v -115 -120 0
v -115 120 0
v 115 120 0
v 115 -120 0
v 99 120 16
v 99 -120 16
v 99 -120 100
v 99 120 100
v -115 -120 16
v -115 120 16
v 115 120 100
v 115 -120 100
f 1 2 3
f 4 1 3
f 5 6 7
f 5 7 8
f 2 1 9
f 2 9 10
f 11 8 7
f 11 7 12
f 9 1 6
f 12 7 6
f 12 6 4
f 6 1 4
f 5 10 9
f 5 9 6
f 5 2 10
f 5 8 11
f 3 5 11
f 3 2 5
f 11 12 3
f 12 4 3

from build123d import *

# Parameters (mm, degrees)
SKETCH_1_W             = 230
SKETCH_1_H             = 240
EXTRUDE_1_DEPTH        = 16
SKETCH_3_R             = 13
CUT_EXTRUDE_1_DEPTH    = 167.976046186
PATTERN_LINEAR_1_COUNT = 3
PATTERN_LINEAR_1_PITCH = 80
SKETCH_4_W             = 16
SKETCH_4_H             = 240
EXTRUDE_2_DEPTH        = 84
SKETCH_5_R             = 13
CUT_EXTRUDE_2_DEPTH    = 265.945277369
PATTERN_LINEAR_2_COUNT = 3
PATTERN_LINEAR_2_PITCH = 80
SKETCH_6_W             = 214
SKETCH_6_H             = 240
EXTRUDE_3_DEPTH        = 16
SKETCH_7_W             = 84
SKETCH_7_H             = 240
EXTRUDE_4_DEPTH        = 16


with BuildPart() as part:
    # 草图1 → 凸台-拉伸1 (new body)
    with BuildSketch(Plane.XY):
        Rectangle(SKETCH_1_W, SKETCH_1_H)
    extrude(amount=EXTRUDE_1_DEPTH)

    # 草图3 → 切除-拉伸1 (cut, through all)
    with BuildSketch(Plane.XY.offset(16)):
        with Locations((-73, 80)):
            Circle(SKETCH_3_R)
        with Locations((-14.5, 80)):
            Circle(SKETCH_3_R)
        with Locations((43.5, 80)):
            Circle(SKETCH_3_R)
    cut_extrude_1 = extrude(amount=-CUT_EXTRUDE_1_DEPTH, mode=Mode.SUBTRACT)

    # 阵列(线性)1: 切除-拉伸1 ×3
    with Locations(*[(0, -i * PATTERN_LINEAR_1_PITCH, 0) for i in range(1, PATTERN_LINEAR_1_COUNT)]):
        add(cut_extrude_1, mode=Mode.SUBTRACT)

    # 草图4 → 凸台-拉伸2 (add)
    with BuildSketch(Plane.XY.offset(16)):
        with Locations((107, 0)):
            Rectangle(SKETCH_4_W, SKETCH_4_H)
    extrude(amount=EXTRUDE_2_DEPTH)

    # 草图5 → 切除-拉伸2 (cut, through all)
    with BuildSketch(Plane.ZY.offset(-99)):
        with Locations((48, 80)):
            Circle(SKETCH_5_R)
    cut_extrude_2 = extrude(amount=-CUT_EXTRUDE_2_DEPTH, mode=Mode.SUBTRACT)

    # 阵列(线性)2: 切除-拉伸2 ×3
    with Locations(*[(0, -i * PATTERN_LINEAR_2_PITCH, 0) for i in range(1, PATTERN_LINEAR_2_COUNT)]):
        add(cut_extrude_2, mode=Mode.SUBTRACT)

    # 草图6 → 凸台-拉伸3 (add)
    with BuildSketch(Plane.XY.offset(16)):
        with Locations((-8, 0)):
            Rectangle(SKETCH_6_W, SKETCH_6_H)
    extrude(amount=-EXTRUDE_3_DEPTH)

    # 草图7 → 凸台-拉伸4 (add)
    with BuildSketch(Plane.ZY.offset(-99)):
        with Locations((58, 0)):
            Rectangle(SKETCH_7_W, SKETCH_7_H)
    extrude(amount=-EXTRUDE_4_DEPTH)


solid = part.part
